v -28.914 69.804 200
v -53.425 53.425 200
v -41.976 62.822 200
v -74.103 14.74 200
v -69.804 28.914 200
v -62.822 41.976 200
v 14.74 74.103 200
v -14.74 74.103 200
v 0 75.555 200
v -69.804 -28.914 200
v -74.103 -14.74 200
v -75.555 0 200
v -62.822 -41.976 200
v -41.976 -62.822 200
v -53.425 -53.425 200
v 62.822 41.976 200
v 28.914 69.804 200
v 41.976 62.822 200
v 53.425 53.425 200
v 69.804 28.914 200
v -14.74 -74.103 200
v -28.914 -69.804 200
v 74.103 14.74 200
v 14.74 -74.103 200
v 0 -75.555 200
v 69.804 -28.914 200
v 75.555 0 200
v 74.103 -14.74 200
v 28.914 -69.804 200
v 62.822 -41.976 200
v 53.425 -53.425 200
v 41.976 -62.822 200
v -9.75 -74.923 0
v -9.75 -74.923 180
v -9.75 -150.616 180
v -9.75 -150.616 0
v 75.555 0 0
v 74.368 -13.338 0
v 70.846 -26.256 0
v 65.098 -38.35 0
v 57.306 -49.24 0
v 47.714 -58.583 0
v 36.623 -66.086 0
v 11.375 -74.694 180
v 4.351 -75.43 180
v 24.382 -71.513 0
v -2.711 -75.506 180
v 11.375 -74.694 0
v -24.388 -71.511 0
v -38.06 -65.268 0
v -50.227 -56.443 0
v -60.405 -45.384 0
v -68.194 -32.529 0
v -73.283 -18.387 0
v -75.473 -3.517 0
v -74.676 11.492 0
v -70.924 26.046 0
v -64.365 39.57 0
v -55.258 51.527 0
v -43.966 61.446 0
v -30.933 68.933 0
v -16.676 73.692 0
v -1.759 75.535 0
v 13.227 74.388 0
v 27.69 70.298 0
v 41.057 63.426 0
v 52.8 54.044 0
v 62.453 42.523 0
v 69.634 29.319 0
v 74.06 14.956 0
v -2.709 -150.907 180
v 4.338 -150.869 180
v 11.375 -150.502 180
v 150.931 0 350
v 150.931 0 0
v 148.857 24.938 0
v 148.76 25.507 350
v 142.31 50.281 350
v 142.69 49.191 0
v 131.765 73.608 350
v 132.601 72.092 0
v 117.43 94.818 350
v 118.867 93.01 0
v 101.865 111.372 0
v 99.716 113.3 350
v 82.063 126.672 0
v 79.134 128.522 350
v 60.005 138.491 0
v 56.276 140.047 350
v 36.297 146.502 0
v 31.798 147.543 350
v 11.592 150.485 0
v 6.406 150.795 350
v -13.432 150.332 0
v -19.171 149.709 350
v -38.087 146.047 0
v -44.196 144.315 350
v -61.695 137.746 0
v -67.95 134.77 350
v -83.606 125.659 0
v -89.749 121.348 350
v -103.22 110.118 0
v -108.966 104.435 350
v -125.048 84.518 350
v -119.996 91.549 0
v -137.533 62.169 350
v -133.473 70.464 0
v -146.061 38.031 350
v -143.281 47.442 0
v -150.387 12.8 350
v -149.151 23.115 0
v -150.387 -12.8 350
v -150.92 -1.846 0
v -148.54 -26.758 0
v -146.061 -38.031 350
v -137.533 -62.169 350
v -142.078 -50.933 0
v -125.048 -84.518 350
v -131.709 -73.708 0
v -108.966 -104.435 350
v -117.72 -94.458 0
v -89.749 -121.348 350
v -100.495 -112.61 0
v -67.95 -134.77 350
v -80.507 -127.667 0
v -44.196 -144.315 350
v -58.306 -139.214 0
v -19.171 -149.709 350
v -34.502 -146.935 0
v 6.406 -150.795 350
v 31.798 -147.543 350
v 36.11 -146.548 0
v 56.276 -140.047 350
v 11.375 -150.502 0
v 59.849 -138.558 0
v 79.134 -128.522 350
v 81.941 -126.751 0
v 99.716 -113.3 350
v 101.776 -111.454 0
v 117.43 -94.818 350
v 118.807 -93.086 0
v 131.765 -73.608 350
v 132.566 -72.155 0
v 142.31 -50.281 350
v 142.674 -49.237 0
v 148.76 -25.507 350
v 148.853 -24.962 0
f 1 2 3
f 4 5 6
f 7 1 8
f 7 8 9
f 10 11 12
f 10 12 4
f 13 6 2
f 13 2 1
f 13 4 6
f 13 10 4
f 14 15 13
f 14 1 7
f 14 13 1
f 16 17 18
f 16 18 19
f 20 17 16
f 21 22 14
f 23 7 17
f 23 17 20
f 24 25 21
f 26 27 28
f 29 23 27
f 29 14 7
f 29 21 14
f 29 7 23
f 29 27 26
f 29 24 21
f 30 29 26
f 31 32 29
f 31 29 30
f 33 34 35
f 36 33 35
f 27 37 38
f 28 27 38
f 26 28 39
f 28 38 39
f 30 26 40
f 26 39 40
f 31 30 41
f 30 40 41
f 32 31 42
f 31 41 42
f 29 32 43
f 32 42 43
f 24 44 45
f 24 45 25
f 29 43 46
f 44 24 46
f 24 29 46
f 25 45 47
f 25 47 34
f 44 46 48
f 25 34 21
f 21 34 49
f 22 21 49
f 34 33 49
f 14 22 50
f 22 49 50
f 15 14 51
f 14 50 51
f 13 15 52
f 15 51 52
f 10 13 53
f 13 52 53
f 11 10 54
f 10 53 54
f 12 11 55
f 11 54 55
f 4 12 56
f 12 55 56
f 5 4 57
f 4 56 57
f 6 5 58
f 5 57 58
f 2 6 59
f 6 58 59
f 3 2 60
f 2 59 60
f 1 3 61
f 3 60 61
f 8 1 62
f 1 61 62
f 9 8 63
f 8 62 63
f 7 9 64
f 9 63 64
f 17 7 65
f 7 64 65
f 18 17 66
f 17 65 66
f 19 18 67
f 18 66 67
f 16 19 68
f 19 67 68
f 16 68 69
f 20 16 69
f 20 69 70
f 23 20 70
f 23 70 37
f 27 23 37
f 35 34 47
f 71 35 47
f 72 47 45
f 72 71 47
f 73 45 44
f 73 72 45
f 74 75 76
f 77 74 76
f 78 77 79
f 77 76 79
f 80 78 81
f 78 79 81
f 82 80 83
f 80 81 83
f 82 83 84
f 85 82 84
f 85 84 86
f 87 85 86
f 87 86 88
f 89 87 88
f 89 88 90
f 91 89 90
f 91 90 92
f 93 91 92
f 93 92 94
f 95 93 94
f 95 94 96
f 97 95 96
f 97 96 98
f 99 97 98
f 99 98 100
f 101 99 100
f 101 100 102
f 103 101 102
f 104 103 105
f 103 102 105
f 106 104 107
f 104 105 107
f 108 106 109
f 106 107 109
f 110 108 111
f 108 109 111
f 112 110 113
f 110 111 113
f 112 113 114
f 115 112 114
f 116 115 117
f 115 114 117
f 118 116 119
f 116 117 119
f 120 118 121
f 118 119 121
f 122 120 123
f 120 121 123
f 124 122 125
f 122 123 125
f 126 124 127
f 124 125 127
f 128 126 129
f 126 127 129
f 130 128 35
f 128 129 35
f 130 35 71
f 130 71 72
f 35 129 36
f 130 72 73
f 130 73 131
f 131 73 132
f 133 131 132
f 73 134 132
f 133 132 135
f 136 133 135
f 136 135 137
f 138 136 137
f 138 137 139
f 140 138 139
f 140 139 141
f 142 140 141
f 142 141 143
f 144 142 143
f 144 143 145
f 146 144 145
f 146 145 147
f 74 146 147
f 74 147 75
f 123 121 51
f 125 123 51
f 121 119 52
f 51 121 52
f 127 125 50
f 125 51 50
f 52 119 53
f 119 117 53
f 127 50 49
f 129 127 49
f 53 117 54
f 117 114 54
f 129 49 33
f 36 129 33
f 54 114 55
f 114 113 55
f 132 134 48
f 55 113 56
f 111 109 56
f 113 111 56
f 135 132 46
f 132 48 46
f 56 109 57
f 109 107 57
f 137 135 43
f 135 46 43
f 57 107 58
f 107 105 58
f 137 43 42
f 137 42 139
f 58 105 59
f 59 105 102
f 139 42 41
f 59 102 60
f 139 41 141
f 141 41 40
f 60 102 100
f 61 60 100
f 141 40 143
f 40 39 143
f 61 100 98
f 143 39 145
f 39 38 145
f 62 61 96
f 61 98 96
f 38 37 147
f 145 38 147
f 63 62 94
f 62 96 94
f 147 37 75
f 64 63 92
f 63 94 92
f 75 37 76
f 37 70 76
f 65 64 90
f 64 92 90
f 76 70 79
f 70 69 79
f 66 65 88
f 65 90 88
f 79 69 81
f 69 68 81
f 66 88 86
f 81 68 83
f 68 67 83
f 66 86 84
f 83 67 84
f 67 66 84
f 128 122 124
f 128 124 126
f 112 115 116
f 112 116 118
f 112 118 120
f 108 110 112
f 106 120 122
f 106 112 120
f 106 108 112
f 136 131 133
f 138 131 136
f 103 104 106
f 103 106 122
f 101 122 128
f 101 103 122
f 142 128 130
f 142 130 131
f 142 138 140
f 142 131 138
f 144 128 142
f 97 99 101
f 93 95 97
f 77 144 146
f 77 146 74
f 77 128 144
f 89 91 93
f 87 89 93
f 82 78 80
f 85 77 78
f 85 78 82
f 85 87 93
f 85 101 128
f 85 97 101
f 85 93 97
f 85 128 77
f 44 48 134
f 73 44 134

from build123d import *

# Parameters (mm, degrees)
F0_R     = 150.931089
F1_DEPTH = 350
F2_R     = 75.554982
F3_DEPTH = 200
F4_W     = 21.125047
F4_H     = 119.437709
F5_DEPTH = 180


with BuildPart() as f1:
    # F0 (on Top) → F1 (new body)
    with BuildSketch(Plane.XY):
        Circle(F0_R)
    extrude(amount=F1_DEPTH)

    # F2 (on face) → F3 (cut)
    with BuildSketch(Plane(origin=(0, 0, 0), x_dir=(1, 0, 0), z_dir=(0, 0, -1))):
        Circle(F2_R)
    extrude(amount=-F3_DEPTH, mode=Mode.SUBTRACT)

    # F4 (on face) → F5 (cut)
    with BuildSketch(Plane(origin=(0, 0, 0), x_dir=(1, 0, 0), z_dir=(0, 0, -1))):
        with Locations((0.812509, 118.625202)):
            Rectangle(F4_W, F4_H)
    extrude(amount=-F5_DEPTH, mode=Mode.SUBTRACT)


solid = f1.part
